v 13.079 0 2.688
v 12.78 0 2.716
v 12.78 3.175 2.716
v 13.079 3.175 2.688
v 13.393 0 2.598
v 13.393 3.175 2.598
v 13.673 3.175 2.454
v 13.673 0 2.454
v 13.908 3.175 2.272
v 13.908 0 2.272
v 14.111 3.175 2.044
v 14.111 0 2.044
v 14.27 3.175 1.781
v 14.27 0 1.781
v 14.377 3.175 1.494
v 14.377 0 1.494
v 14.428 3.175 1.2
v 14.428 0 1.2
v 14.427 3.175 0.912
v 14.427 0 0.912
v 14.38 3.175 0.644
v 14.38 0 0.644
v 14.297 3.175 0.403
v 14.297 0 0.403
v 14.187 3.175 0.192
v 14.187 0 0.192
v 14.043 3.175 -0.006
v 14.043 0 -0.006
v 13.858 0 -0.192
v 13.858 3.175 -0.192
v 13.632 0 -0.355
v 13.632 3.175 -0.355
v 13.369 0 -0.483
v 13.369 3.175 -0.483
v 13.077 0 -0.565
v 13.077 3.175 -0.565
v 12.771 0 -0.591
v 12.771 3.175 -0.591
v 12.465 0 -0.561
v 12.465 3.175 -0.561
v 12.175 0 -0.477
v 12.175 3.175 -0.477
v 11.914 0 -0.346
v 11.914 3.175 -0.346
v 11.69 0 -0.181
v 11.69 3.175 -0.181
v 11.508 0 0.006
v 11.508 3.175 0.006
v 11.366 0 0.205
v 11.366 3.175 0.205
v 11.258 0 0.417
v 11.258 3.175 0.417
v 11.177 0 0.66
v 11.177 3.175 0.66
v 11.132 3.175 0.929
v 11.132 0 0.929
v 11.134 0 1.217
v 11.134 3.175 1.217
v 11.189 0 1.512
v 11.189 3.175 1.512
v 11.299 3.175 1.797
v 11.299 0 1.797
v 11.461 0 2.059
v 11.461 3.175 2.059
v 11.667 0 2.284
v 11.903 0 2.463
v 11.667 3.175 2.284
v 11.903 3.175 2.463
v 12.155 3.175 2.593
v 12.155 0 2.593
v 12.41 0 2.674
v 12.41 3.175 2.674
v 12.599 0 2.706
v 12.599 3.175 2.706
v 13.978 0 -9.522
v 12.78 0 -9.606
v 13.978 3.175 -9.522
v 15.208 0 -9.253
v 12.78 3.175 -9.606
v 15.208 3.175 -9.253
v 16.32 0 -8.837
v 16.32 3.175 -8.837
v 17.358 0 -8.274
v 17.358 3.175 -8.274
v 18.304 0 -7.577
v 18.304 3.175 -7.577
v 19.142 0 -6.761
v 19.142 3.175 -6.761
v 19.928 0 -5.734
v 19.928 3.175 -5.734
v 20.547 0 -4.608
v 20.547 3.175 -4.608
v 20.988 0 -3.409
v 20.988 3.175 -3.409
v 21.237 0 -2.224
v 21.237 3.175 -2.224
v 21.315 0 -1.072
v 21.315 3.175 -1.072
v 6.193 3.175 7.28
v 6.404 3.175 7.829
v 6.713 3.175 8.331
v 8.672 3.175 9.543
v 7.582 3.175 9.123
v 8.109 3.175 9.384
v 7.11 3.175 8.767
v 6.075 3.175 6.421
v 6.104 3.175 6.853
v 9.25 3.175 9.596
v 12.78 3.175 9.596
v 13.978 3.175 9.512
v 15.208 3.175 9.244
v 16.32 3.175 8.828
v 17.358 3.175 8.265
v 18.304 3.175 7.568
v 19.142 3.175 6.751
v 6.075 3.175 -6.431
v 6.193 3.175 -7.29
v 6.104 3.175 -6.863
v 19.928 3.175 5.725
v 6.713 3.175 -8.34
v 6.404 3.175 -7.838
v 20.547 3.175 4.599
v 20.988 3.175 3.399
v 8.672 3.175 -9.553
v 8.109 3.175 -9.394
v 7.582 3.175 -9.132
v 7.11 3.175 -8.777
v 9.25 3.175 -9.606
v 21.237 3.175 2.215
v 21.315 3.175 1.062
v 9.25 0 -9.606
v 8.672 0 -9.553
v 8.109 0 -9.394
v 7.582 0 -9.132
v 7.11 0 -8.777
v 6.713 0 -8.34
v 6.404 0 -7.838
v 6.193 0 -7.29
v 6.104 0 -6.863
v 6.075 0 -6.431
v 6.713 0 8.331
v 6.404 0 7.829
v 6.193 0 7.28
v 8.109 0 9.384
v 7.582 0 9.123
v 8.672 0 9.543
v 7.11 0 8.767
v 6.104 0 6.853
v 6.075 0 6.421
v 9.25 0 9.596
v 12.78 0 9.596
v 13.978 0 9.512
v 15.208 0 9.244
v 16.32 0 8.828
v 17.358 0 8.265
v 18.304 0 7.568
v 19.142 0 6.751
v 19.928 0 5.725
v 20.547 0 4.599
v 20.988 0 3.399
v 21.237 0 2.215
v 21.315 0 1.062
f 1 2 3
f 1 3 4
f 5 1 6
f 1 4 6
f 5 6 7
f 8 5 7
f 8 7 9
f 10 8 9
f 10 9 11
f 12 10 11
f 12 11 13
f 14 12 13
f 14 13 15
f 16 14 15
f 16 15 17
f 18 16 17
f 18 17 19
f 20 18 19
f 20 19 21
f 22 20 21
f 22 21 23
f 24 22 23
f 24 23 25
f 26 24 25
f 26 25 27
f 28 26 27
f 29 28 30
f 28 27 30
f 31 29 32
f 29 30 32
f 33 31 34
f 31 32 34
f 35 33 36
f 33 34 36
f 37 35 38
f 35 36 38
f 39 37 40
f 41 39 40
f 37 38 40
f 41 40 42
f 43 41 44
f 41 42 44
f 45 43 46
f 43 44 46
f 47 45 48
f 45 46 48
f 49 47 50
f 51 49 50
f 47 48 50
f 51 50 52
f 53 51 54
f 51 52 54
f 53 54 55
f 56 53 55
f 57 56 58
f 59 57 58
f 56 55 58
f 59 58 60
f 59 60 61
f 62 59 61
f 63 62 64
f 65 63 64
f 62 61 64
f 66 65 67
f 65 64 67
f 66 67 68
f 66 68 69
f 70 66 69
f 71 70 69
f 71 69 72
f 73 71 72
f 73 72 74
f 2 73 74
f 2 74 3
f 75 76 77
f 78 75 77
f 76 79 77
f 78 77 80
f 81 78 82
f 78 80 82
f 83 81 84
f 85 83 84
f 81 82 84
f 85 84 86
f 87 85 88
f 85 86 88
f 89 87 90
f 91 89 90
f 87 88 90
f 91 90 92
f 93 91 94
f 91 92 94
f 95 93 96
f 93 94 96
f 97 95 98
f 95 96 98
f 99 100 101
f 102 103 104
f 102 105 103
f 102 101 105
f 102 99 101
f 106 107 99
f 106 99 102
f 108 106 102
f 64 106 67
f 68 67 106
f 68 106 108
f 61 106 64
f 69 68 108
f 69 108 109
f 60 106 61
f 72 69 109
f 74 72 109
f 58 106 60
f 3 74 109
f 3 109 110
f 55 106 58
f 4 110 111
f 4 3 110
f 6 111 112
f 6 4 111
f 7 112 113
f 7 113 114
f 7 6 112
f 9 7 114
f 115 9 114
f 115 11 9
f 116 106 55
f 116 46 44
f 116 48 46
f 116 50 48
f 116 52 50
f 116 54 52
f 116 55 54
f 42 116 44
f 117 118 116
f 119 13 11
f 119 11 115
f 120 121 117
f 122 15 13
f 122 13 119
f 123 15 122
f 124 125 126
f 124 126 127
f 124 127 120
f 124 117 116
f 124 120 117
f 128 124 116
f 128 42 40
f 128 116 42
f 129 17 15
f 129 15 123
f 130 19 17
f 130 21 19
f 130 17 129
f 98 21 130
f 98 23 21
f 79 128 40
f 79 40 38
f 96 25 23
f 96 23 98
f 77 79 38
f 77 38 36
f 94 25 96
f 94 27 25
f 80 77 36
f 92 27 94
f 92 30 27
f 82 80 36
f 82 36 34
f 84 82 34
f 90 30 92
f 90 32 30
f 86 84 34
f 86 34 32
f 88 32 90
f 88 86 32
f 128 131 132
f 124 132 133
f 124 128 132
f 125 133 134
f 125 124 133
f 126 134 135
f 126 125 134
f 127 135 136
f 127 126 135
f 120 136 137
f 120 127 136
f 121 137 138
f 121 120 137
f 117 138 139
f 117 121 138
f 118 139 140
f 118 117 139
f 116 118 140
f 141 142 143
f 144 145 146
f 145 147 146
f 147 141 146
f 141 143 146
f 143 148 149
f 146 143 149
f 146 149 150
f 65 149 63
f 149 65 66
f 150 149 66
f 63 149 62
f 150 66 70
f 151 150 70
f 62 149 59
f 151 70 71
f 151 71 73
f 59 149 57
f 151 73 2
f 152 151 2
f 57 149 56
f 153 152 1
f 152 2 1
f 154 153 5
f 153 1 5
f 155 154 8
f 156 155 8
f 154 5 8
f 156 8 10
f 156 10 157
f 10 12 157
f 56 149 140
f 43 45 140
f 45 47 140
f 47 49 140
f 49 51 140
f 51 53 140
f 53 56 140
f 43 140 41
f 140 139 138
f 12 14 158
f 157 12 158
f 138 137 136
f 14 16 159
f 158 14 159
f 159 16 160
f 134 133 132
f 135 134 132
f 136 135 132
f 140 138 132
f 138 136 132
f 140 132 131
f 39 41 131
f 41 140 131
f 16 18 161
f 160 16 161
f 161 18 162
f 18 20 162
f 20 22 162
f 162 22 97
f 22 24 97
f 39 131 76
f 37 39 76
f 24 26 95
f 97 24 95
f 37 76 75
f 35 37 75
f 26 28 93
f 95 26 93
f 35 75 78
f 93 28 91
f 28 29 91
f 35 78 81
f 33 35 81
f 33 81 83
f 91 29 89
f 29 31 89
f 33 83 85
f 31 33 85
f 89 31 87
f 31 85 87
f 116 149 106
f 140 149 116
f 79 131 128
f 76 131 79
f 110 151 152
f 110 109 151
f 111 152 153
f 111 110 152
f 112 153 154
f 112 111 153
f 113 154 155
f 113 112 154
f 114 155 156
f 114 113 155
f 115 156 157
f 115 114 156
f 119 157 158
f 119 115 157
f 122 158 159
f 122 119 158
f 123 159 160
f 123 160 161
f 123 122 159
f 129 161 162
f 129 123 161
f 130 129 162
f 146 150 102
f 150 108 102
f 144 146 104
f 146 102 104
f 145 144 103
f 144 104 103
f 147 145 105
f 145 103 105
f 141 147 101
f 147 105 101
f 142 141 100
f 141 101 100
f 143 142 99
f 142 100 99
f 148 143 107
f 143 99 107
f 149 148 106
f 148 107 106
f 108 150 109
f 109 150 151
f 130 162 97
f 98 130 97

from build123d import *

# Parameters (mm, degrees)
SKETCH1_W           = 50.8
SKETCH1_H           = 22.86
BOSS_EXTRUDE1_DEPTH = 3.175
FILLET1_R           = 10.16
SKETCH3_R           = 1.9685
CUT_EXTRUDE1_DEPTH  = 29.033649869
FILLET3_R           = 10.16
SCALE1_SCALE_X      = 0.84
SCALE1_SCALE_Y      = 1
SCALE1_SCALE_Z      = 0.84
SKETCH4_W           = 27.432
SKETCH4_H           = 19.2024
CUT_EXTRUDE2_DEPTH  = 24.632305844
FILLET4_R           = 3.175


with BuildPart() as part:
    # Sketch1 → Boss-Extrude1 (new body)
    with BuildSketch(Plane(origin=(0, 0, 0), x_dir=(1, 0, 0), z_dir=(0, 1, 0))):
        Rectangle(SKETCH1_W, SKETCH1_H)
    extrude(amount=BOSS_EXTRUDE1_DEPTH)

    # Fillet1
    fillet1_edges = [part.edges().sort_by_distance(p)[0] for p in [
        (25.4, 1.5875, 11.43),
        (-25.4, 1.5875, 11.43),
    ]]
    fillet(fillet1_edges, radius=FILLET1_R)

    # Sketch3 → Cut-Extrude1 (cut, through all)
    with BuildSketch(Plane(origin=(0, 3.175, 0), x_dir=(1, 0, 0), z_dir=(0, 1, 0))):
        with Locations(Location((15.24, -1.27, 0), (0, 0, 270))):
            Circle(SKETCH3_R)
        with Locations(Location((-3.81, -1.27, 0), (0, 0, 270))):
            Circle(SKETCH3_R)
    extrude(amount=-CUT_EXTRUDE1_DEPTH, mode=Mode.SUBTRACT)

    # Fillet3
    fillet3_edges = [part.edges().sort_by_distance(p)[0] for p in [
        (-25.4, 1.5875, -11.43),
        (25.4, 1.5875, -11.43),
    ]]
    fillet(fillet3_edges, radius=FILLET3_R)


with BuildPart() as part_1:
    # Scale1: scaled about (-0.132729811, 1.5875, -0.029495513)
    add(part.part.scale((SCALE1_SCALE_X, SCALE1_SCALE_Y, SCALE1_SCALE_Z), about=(-0.132729811, 1.5875, -0.029495513)))

    # Sketch4 → Cut-Extrude2 (cut, through all)
    with BuildSketch(Plane(origin=(0, 0, 0), x_dir=(-1, 0, 0), z_dir=(0, -1, 0))):
        with Locations((7.64123677, 0.004719282)):
            Rectangle(SKETCH4_W, SKETCH4_H)
    extrude(amount=-CUT_EXTRUDE2_DEPTH, mode=Mode.SUBTRACT)

    # Fillet4
    fillet4_edges = [part_1.edges().sort_by_distance(p)[0] for p in [
        (6.07476323, 1.5875, 9.596480718),
        (6.07476323, 1.5875, -9.605919282),
    ]]
    fillet(fillet4_edges, radius=FILLET4_R)


solid = part_1.part
